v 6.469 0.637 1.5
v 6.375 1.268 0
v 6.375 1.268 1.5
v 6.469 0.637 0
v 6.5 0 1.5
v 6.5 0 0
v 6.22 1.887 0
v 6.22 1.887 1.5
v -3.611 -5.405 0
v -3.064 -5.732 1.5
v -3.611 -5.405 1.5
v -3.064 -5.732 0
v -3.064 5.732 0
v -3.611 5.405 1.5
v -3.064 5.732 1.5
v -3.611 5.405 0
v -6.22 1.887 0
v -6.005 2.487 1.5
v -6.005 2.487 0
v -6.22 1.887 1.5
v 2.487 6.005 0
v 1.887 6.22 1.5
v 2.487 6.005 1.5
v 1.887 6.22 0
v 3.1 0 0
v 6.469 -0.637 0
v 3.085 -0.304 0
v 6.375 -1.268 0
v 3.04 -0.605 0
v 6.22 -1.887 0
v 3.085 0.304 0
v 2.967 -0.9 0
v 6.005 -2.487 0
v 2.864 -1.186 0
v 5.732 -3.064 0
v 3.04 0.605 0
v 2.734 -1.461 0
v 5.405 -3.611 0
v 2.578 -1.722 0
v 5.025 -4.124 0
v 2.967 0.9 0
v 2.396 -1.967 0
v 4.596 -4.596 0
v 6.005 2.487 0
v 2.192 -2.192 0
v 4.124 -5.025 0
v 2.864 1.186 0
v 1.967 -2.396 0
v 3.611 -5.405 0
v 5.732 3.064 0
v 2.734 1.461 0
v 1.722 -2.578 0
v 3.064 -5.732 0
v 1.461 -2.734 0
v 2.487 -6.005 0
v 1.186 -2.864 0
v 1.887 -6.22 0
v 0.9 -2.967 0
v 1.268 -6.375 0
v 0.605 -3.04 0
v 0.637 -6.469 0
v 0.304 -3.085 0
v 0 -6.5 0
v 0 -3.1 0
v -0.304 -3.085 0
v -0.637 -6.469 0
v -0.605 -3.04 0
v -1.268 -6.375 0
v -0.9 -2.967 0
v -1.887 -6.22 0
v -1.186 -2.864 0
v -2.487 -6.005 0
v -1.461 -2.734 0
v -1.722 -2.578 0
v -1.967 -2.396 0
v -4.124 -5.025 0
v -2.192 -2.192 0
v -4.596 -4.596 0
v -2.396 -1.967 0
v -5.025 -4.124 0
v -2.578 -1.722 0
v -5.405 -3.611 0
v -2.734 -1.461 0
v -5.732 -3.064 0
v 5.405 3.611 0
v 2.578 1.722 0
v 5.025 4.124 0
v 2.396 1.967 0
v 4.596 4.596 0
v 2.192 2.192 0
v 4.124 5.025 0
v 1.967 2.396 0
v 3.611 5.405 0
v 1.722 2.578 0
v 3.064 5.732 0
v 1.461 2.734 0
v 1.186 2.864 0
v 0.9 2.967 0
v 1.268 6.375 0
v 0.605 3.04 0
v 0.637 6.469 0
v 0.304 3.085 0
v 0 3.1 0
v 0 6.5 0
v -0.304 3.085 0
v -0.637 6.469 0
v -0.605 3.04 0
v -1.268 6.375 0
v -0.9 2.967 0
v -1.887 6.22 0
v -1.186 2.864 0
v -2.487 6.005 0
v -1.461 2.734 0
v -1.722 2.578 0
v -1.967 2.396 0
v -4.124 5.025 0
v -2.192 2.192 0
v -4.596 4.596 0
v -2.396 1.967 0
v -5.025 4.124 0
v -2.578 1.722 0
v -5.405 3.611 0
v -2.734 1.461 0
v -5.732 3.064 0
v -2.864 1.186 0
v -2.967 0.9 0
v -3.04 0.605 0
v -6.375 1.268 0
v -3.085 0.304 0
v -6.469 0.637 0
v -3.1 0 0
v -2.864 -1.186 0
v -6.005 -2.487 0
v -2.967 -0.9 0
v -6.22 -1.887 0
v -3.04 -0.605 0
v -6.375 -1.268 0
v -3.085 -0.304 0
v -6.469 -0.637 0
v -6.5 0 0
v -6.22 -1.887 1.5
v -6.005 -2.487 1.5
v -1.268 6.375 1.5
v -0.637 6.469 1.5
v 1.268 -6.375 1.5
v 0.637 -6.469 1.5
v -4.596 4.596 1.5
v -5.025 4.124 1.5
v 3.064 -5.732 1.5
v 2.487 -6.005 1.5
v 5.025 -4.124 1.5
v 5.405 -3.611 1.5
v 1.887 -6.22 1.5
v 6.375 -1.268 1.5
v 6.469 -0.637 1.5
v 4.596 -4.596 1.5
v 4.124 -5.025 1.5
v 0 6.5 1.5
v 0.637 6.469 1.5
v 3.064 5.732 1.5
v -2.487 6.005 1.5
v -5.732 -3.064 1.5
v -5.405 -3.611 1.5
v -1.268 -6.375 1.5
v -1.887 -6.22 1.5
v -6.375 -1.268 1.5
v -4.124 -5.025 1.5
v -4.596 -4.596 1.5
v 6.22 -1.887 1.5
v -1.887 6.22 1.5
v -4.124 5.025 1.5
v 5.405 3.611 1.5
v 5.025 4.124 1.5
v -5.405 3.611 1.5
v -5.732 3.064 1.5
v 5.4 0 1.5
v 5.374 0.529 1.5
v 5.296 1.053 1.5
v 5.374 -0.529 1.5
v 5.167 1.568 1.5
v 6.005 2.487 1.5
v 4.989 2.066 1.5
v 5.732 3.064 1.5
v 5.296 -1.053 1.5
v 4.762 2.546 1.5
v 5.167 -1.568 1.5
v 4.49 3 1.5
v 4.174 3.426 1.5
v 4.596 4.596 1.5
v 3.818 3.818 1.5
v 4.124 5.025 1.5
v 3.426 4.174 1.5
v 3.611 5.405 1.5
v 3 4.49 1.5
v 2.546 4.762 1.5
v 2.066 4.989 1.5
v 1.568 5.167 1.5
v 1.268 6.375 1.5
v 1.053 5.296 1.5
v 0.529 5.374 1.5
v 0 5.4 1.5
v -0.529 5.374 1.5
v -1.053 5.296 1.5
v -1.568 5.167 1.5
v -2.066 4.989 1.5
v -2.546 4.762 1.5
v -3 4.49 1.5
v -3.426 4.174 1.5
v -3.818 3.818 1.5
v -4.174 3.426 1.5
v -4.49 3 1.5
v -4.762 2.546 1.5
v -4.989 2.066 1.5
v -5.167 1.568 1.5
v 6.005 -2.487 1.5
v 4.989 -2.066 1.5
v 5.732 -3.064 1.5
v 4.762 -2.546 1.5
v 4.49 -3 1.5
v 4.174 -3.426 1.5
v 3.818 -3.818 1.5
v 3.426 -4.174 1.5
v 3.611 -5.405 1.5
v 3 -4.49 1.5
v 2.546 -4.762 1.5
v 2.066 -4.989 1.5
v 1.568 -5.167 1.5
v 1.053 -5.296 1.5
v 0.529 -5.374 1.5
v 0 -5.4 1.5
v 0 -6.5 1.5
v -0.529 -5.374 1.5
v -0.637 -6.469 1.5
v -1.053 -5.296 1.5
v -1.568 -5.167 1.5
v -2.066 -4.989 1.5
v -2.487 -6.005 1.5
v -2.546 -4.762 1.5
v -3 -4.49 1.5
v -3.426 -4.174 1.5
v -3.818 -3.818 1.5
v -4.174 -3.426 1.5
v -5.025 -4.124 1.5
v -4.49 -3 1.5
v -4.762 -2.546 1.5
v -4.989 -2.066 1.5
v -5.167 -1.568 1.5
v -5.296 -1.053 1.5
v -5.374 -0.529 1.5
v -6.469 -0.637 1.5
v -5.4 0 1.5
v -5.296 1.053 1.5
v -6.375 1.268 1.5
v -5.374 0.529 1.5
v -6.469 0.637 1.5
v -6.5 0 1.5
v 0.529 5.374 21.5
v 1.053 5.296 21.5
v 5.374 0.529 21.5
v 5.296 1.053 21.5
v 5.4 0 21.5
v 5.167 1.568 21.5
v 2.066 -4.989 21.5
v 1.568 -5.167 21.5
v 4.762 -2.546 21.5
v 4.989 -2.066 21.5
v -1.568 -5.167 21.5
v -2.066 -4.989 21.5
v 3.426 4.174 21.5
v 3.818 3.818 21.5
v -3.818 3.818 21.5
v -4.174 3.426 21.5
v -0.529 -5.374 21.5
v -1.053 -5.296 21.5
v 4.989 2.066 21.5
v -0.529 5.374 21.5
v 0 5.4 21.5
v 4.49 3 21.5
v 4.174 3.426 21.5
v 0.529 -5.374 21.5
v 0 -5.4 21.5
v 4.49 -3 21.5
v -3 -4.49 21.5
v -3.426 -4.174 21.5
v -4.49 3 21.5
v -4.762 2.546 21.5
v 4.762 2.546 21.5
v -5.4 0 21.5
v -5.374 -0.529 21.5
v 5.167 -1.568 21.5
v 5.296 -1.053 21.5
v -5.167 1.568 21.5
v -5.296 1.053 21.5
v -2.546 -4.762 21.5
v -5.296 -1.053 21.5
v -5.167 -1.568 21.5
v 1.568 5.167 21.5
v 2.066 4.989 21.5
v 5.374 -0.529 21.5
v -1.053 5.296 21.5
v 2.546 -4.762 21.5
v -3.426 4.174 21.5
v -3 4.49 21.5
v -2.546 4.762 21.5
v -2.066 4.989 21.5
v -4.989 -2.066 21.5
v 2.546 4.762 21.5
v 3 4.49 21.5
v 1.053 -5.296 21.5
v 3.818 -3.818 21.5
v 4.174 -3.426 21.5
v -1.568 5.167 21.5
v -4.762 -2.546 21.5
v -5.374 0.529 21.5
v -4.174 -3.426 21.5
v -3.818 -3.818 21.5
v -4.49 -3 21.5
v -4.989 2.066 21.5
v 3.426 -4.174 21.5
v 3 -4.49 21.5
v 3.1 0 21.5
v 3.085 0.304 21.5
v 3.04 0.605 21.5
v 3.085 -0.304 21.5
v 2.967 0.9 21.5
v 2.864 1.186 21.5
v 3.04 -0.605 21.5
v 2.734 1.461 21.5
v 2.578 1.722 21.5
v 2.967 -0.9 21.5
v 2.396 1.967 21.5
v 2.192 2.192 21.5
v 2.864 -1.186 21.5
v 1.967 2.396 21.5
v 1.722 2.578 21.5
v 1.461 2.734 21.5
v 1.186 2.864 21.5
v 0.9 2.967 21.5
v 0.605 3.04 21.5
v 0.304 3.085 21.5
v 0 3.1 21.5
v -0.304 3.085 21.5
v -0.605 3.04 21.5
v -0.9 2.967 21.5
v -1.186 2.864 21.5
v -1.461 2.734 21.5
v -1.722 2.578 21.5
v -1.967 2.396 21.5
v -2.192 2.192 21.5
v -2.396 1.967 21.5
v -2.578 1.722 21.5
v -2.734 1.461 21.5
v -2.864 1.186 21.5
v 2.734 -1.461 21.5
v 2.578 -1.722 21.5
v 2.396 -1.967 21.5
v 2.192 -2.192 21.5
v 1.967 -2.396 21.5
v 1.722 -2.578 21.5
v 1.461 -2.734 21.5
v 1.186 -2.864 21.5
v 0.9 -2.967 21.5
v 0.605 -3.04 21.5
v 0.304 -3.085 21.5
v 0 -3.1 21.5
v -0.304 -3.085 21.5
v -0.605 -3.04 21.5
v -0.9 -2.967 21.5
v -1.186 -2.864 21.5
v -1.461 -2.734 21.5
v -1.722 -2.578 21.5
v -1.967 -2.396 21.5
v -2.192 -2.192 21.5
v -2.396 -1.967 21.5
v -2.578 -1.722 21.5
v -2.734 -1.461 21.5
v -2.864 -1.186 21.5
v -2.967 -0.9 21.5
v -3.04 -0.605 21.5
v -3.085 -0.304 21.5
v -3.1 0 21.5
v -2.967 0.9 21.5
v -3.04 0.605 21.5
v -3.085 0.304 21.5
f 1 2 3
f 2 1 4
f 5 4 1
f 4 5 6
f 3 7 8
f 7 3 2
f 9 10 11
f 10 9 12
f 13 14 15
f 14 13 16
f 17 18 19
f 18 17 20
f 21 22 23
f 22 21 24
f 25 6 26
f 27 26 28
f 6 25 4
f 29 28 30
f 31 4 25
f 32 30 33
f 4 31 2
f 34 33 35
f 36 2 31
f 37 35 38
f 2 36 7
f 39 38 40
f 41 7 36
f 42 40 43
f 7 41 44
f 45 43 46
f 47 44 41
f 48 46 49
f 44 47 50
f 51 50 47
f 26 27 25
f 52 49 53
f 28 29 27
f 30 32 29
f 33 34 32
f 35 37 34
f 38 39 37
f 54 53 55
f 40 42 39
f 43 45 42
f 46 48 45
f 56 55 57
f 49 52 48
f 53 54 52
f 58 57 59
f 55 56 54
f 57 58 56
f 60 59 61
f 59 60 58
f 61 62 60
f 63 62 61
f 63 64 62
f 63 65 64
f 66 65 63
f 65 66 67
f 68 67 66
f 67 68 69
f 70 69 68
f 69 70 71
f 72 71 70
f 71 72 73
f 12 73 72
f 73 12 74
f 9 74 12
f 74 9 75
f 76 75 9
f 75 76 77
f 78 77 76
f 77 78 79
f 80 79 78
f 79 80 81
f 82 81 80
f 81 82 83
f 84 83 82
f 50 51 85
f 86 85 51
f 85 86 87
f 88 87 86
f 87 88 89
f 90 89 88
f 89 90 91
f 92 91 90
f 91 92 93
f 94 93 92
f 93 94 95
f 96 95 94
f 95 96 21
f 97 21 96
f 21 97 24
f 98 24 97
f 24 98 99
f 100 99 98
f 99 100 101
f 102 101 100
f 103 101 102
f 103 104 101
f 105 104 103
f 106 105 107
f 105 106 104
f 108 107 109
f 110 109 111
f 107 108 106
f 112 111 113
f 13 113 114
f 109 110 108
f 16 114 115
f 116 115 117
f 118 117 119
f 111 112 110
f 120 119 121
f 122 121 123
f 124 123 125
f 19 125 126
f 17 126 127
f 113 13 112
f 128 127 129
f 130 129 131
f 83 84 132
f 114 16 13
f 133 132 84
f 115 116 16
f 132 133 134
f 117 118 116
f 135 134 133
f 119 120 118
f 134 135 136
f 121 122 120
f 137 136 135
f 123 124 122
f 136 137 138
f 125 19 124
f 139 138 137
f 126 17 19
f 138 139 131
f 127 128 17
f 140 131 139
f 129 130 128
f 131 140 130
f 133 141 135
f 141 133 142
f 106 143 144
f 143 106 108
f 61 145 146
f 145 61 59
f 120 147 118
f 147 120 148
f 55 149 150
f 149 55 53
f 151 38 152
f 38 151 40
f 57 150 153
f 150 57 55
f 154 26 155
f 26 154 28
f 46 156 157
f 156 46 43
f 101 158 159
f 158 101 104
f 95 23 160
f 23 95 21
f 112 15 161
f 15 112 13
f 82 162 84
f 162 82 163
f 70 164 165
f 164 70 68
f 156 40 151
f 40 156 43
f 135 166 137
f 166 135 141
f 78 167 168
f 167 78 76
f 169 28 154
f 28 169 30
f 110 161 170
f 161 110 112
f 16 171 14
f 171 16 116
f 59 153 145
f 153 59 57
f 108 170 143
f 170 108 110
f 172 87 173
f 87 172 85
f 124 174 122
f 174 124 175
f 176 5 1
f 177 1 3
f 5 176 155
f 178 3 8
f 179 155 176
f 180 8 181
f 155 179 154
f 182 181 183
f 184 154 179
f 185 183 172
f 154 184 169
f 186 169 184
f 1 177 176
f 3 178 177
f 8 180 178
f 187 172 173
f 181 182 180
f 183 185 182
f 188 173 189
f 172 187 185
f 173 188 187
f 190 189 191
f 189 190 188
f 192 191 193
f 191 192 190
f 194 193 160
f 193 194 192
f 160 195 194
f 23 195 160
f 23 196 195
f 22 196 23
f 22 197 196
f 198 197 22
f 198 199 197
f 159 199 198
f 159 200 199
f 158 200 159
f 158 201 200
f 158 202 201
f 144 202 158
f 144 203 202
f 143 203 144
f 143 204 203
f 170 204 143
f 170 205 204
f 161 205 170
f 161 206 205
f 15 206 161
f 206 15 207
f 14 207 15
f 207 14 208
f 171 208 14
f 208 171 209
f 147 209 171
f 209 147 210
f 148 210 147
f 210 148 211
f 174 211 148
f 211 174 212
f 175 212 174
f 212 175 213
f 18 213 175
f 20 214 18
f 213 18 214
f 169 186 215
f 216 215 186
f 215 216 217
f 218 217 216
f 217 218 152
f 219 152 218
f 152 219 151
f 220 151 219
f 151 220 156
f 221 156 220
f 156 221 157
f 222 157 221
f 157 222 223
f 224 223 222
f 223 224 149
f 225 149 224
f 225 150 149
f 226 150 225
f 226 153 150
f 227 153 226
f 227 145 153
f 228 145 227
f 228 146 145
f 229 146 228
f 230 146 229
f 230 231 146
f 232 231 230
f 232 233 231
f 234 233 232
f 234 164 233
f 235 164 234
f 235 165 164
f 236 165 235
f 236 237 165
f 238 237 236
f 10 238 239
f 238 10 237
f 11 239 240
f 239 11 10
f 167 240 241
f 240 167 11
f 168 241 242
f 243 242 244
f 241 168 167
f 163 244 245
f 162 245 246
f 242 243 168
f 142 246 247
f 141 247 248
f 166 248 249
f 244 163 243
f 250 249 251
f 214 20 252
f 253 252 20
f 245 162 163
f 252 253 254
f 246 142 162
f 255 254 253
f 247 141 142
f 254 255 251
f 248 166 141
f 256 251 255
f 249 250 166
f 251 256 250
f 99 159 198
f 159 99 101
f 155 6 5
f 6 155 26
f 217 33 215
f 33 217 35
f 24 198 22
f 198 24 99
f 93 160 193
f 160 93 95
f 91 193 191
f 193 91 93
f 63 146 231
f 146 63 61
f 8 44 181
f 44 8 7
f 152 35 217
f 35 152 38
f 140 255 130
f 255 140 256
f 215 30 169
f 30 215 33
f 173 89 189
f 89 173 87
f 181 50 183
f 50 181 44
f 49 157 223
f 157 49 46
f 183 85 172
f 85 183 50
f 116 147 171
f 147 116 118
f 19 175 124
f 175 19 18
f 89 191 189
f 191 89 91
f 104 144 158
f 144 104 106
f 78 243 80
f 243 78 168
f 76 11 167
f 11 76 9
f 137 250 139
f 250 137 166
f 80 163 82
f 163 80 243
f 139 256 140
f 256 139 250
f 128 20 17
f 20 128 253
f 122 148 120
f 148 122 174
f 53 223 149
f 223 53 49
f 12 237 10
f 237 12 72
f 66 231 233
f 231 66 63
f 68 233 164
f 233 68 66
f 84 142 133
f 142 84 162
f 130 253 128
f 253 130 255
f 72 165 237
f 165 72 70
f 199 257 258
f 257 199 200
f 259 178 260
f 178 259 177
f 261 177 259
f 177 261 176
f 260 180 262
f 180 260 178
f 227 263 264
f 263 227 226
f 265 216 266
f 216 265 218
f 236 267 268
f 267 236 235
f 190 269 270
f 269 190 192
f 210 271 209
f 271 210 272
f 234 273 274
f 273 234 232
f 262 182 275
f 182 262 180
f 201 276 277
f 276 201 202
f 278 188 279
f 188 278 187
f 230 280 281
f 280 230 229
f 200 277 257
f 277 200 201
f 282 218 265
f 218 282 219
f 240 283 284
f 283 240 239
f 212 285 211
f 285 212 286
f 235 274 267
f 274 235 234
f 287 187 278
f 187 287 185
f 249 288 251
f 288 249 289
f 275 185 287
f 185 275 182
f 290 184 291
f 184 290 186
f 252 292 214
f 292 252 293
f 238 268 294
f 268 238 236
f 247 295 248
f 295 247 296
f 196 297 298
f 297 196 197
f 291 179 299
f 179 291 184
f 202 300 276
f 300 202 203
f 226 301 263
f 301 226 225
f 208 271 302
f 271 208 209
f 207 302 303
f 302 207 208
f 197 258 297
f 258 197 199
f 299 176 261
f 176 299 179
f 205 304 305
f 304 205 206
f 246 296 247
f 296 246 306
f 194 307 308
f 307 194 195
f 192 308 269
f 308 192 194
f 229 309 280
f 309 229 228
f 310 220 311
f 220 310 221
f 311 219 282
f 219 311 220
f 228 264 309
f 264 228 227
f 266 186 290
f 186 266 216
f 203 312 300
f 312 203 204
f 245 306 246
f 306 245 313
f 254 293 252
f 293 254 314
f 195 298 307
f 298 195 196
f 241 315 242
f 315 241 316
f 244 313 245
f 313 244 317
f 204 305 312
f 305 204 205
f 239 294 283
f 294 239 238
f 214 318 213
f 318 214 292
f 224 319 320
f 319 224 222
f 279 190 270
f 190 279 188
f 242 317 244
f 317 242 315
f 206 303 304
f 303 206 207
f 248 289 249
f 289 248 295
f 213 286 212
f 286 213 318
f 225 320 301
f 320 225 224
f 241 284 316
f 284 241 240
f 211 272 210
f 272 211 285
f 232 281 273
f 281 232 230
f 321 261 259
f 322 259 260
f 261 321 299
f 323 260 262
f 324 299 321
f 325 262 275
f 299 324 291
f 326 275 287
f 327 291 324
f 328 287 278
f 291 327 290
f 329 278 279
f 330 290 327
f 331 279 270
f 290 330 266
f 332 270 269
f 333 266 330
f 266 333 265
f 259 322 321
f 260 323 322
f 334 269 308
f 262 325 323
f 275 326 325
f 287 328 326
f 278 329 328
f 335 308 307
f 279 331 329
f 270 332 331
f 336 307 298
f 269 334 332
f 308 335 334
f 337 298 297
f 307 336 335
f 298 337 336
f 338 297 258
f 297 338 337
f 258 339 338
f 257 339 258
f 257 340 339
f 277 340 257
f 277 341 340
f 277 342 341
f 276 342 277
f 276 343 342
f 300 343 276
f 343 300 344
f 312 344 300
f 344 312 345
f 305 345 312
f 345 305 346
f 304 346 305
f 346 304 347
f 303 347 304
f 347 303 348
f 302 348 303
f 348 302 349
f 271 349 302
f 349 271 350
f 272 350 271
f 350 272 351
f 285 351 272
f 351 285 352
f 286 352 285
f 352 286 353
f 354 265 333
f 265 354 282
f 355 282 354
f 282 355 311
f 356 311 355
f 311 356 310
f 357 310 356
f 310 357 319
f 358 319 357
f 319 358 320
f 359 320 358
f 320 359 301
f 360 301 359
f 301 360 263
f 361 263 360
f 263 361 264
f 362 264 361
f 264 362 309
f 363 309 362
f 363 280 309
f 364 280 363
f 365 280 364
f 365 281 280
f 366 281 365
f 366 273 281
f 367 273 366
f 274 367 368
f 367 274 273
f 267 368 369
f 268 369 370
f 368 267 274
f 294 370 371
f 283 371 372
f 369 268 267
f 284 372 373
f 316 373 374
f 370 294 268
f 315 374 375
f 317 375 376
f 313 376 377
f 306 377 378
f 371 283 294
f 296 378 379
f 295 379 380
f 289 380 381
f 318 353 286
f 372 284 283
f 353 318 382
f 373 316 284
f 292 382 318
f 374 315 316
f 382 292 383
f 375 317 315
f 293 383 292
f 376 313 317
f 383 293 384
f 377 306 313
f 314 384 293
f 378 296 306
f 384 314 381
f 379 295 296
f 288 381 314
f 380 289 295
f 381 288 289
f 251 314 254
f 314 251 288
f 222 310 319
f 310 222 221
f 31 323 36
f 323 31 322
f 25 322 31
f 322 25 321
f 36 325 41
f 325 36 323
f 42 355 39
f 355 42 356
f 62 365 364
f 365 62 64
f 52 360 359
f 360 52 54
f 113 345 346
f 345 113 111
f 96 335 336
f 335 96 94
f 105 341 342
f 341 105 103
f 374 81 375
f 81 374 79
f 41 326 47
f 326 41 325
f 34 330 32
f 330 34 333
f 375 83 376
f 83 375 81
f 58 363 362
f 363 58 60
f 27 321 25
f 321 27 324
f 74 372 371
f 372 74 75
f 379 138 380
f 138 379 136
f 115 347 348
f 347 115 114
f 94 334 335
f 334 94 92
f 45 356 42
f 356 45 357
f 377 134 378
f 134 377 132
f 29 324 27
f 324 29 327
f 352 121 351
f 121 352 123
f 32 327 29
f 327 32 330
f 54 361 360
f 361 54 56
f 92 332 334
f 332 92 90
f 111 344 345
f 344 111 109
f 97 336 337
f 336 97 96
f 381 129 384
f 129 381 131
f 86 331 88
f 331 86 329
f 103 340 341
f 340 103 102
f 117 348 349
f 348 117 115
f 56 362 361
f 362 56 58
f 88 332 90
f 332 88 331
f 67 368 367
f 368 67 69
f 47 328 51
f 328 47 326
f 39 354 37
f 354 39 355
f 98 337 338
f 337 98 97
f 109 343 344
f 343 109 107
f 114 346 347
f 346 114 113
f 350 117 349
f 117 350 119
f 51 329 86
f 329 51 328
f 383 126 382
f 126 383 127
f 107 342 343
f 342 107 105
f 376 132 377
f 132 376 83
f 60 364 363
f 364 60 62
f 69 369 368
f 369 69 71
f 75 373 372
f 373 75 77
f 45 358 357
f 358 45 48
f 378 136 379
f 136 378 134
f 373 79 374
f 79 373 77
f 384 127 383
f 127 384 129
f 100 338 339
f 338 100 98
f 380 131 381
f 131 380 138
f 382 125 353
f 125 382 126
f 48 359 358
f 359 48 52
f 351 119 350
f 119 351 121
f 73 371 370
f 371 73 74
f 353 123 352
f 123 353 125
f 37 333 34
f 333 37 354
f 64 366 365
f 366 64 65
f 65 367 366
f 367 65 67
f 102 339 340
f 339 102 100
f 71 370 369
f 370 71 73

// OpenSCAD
// Dimensions
COLLAR_OD = 13;            // Outer diameter of the bottom collar
COLLAR_THICK = 1.5;        // Thickness of the bottom collar
SLEEVE_OD = 10.8;          // Outer diameter of the sleeve body
SLEEVE_HEIGHT = 21.5;      // Total height of the sleeve from the bed
BORE_DIA = 6.2;            // Inner bore diameter for the 0.2 mL tube
BORE_EXTEND = 0.1;         // Extra length for the cutting cylinder to ensure open ends

$fn = 64;

difference() {
    // Main solid body
    union() {
        cylinder(d = COLLAR_OD, h = COLLAR_THICK, center = false);
        cylinder(d = SLEEVE_OD, h = SLEEVE_HEIGHT, center = false);
    }
    // Through bore
    cylinder(d = BORE_DIA, h = SLEEVE_HEIGHT + BORE_EXTEND, center = false);
}
